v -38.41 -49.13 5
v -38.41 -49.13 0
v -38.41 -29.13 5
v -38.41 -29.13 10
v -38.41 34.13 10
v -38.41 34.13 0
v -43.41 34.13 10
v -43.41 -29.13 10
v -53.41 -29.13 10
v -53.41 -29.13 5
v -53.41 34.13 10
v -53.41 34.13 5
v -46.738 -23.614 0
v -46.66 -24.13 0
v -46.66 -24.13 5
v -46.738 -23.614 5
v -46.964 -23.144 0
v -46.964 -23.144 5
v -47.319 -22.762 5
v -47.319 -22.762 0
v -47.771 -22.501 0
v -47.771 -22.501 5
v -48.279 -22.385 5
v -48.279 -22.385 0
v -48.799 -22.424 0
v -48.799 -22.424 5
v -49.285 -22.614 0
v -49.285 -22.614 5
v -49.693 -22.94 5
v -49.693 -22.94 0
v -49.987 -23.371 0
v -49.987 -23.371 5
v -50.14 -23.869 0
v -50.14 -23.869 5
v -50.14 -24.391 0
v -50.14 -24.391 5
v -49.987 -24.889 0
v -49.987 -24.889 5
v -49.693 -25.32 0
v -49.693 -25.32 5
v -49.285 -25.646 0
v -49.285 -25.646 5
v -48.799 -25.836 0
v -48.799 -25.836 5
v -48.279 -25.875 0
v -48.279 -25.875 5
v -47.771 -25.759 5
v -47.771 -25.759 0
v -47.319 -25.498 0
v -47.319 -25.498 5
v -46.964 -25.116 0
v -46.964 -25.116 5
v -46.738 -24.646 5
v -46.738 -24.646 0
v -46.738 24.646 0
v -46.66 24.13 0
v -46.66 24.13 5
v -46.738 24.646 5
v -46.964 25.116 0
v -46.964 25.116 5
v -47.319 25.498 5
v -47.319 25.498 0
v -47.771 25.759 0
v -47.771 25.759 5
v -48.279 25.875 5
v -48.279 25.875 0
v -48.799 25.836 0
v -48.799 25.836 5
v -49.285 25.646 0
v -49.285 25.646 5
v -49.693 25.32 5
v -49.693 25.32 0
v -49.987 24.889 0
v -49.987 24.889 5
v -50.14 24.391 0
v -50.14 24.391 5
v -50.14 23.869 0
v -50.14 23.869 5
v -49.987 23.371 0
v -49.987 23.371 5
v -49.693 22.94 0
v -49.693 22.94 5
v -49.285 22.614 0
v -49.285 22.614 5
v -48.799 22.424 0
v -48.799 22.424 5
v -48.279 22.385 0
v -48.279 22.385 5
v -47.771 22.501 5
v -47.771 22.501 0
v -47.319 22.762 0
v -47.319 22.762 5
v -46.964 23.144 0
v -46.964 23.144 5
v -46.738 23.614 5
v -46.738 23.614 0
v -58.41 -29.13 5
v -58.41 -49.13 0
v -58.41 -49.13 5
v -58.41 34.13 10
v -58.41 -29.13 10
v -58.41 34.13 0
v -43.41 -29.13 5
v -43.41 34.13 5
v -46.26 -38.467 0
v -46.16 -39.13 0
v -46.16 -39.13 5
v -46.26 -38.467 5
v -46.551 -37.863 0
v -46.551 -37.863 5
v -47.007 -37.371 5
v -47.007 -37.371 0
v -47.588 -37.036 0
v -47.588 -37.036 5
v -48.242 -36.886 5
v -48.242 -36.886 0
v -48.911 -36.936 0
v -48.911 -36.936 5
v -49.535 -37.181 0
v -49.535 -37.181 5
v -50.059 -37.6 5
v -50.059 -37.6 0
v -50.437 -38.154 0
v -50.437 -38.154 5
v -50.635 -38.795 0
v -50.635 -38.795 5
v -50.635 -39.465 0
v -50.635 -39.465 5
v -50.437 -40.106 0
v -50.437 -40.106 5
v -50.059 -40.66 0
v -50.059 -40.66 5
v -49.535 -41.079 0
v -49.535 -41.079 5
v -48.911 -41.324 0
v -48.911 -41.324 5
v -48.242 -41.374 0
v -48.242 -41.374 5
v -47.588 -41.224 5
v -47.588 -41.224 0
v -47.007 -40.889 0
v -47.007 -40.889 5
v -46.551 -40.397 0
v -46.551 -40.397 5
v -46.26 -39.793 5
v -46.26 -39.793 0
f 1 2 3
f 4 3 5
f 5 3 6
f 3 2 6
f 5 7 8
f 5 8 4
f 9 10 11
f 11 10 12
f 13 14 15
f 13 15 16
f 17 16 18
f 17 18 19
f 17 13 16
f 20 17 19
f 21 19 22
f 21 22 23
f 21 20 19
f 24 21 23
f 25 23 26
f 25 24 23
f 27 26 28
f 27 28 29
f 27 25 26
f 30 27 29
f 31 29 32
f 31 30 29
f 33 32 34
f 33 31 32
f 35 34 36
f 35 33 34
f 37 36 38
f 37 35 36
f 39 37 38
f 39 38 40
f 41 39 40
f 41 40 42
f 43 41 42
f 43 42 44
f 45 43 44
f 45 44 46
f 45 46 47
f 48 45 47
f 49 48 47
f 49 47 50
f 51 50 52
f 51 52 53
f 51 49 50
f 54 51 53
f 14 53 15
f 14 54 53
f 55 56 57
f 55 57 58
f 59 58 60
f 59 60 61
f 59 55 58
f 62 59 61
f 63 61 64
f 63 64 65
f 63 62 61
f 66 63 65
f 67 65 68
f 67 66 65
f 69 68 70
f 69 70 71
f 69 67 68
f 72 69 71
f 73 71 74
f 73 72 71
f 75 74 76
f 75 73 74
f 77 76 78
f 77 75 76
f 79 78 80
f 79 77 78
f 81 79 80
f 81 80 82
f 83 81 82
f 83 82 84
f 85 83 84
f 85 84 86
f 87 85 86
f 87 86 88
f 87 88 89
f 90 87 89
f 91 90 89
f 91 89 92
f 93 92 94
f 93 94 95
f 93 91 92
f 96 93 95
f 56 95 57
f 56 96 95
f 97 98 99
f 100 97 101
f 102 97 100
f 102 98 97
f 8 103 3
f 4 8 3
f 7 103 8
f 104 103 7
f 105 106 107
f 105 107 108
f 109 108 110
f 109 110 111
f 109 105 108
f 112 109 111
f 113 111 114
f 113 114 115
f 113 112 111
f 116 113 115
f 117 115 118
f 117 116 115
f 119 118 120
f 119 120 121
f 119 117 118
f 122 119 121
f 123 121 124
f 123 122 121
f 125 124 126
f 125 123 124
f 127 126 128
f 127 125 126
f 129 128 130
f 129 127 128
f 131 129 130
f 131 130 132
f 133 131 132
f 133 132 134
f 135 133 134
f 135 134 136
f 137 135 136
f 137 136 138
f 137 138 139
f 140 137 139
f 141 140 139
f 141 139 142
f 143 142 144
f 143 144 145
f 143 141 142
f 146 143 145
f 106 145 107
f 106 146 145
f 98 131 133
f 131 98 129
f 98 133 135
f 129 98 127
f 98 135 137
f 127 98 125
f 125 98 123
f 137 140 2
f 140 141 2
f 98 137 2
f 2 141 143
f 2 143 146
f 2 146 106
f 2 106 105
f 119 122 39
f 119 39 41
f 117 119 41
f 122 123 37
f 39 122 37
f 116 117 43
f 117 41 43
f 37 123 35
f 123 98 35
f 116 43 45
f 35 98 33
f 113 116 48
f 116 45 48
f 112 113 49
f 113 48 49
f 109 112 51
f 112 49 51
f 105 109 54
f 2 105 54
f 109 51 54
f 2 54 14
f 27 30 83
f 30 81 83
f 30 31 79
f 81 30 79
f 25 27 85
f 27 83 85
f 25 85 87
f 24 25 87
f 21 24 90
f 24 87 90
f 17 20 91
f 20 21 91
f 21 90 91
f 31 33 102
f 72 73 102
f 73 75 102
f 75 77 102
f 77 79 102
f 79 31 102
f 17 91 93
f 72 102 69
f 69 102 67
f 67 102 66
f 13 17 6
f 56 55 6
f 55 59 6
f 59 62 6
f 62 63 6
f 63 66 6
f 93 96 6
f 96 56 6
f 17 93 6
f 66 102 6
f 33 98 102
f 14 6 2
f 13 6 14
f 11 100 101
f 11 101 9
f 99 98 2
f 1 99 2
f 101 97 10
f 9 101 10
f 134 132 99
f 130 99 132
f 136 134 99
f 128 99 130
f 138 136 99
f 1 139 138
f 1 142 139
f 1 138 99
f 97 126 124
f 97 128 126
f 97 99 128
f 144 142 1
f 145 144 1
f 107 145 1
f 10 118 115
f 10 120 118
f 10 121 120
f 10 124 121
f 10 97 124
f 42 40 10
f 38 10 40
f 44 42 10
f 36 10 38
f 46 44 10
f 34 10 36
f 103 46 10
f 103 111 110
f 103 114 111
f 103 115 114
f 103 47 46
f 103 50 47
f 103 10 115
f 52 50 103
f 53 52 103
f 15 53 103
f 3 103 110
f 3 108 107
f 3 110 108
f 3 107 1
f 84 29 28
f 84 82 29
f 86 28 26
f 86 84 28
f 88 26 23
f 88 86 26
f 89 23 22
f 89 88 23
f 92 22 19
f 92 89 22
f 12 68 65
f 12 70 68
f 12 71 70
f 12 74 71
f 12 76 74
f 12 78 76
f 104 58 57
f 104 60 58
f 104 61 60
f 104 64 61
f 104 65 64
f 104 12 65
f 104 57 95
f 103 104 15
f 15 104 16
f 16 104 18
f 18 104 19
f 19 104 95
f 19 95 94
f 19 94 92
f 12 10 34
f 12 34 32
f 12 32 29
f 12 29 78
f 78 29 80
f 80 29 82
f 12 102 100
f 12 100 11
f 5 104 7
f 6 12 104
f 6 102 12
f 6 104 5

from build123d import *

# Parameters (mm, degrees)
SKETCH_W     = 20
SKETCH_H     = 83.26
SKETCH_R     = 1.75
SKETCH_R_2   = 2.25
PAD_DEPTH    = 5
SKETCH001_W  = 5
SKETCH001_H  = 63.26
PAD001_DEPTH = 5


with BuildPart() as part:
    # Sketch → Pad (new body)
    with BuildSketch(Plane.XY):
        with Locations((-48.41, -7.5)):
            Rectangle(SKETCH_W, SKETCH_H)
        with Locations((-48.41, -24.13)):
            Circle(SKETCH_R, mode=Mode.SUBTRACT)
        with Locations((-48.41, 24.13)):
            Circle(SKETCH_R, mode=Mode.SUBTRACT)
        with Locations((-48.41, -39.13)):
            Circle(SKETCH_R_2, mode=Mode.SUBTRACT)
    extrude(amount=PAD_DEPTH)

    # Sketch001 → Pad001 (new body)
    with BuildSketch(Plane.XY.offset(5)):
        with Locations((-40.91, 2.5)):
            Rectangle(SKETCH001_W, SKETCH001_H)
        with Locations((-55.91, 2.5)):
            Rectangle(SKETCH001_W, SKETCH001_H)
    extrude(amount=PAD001_DEPTH)


solid = part.part
